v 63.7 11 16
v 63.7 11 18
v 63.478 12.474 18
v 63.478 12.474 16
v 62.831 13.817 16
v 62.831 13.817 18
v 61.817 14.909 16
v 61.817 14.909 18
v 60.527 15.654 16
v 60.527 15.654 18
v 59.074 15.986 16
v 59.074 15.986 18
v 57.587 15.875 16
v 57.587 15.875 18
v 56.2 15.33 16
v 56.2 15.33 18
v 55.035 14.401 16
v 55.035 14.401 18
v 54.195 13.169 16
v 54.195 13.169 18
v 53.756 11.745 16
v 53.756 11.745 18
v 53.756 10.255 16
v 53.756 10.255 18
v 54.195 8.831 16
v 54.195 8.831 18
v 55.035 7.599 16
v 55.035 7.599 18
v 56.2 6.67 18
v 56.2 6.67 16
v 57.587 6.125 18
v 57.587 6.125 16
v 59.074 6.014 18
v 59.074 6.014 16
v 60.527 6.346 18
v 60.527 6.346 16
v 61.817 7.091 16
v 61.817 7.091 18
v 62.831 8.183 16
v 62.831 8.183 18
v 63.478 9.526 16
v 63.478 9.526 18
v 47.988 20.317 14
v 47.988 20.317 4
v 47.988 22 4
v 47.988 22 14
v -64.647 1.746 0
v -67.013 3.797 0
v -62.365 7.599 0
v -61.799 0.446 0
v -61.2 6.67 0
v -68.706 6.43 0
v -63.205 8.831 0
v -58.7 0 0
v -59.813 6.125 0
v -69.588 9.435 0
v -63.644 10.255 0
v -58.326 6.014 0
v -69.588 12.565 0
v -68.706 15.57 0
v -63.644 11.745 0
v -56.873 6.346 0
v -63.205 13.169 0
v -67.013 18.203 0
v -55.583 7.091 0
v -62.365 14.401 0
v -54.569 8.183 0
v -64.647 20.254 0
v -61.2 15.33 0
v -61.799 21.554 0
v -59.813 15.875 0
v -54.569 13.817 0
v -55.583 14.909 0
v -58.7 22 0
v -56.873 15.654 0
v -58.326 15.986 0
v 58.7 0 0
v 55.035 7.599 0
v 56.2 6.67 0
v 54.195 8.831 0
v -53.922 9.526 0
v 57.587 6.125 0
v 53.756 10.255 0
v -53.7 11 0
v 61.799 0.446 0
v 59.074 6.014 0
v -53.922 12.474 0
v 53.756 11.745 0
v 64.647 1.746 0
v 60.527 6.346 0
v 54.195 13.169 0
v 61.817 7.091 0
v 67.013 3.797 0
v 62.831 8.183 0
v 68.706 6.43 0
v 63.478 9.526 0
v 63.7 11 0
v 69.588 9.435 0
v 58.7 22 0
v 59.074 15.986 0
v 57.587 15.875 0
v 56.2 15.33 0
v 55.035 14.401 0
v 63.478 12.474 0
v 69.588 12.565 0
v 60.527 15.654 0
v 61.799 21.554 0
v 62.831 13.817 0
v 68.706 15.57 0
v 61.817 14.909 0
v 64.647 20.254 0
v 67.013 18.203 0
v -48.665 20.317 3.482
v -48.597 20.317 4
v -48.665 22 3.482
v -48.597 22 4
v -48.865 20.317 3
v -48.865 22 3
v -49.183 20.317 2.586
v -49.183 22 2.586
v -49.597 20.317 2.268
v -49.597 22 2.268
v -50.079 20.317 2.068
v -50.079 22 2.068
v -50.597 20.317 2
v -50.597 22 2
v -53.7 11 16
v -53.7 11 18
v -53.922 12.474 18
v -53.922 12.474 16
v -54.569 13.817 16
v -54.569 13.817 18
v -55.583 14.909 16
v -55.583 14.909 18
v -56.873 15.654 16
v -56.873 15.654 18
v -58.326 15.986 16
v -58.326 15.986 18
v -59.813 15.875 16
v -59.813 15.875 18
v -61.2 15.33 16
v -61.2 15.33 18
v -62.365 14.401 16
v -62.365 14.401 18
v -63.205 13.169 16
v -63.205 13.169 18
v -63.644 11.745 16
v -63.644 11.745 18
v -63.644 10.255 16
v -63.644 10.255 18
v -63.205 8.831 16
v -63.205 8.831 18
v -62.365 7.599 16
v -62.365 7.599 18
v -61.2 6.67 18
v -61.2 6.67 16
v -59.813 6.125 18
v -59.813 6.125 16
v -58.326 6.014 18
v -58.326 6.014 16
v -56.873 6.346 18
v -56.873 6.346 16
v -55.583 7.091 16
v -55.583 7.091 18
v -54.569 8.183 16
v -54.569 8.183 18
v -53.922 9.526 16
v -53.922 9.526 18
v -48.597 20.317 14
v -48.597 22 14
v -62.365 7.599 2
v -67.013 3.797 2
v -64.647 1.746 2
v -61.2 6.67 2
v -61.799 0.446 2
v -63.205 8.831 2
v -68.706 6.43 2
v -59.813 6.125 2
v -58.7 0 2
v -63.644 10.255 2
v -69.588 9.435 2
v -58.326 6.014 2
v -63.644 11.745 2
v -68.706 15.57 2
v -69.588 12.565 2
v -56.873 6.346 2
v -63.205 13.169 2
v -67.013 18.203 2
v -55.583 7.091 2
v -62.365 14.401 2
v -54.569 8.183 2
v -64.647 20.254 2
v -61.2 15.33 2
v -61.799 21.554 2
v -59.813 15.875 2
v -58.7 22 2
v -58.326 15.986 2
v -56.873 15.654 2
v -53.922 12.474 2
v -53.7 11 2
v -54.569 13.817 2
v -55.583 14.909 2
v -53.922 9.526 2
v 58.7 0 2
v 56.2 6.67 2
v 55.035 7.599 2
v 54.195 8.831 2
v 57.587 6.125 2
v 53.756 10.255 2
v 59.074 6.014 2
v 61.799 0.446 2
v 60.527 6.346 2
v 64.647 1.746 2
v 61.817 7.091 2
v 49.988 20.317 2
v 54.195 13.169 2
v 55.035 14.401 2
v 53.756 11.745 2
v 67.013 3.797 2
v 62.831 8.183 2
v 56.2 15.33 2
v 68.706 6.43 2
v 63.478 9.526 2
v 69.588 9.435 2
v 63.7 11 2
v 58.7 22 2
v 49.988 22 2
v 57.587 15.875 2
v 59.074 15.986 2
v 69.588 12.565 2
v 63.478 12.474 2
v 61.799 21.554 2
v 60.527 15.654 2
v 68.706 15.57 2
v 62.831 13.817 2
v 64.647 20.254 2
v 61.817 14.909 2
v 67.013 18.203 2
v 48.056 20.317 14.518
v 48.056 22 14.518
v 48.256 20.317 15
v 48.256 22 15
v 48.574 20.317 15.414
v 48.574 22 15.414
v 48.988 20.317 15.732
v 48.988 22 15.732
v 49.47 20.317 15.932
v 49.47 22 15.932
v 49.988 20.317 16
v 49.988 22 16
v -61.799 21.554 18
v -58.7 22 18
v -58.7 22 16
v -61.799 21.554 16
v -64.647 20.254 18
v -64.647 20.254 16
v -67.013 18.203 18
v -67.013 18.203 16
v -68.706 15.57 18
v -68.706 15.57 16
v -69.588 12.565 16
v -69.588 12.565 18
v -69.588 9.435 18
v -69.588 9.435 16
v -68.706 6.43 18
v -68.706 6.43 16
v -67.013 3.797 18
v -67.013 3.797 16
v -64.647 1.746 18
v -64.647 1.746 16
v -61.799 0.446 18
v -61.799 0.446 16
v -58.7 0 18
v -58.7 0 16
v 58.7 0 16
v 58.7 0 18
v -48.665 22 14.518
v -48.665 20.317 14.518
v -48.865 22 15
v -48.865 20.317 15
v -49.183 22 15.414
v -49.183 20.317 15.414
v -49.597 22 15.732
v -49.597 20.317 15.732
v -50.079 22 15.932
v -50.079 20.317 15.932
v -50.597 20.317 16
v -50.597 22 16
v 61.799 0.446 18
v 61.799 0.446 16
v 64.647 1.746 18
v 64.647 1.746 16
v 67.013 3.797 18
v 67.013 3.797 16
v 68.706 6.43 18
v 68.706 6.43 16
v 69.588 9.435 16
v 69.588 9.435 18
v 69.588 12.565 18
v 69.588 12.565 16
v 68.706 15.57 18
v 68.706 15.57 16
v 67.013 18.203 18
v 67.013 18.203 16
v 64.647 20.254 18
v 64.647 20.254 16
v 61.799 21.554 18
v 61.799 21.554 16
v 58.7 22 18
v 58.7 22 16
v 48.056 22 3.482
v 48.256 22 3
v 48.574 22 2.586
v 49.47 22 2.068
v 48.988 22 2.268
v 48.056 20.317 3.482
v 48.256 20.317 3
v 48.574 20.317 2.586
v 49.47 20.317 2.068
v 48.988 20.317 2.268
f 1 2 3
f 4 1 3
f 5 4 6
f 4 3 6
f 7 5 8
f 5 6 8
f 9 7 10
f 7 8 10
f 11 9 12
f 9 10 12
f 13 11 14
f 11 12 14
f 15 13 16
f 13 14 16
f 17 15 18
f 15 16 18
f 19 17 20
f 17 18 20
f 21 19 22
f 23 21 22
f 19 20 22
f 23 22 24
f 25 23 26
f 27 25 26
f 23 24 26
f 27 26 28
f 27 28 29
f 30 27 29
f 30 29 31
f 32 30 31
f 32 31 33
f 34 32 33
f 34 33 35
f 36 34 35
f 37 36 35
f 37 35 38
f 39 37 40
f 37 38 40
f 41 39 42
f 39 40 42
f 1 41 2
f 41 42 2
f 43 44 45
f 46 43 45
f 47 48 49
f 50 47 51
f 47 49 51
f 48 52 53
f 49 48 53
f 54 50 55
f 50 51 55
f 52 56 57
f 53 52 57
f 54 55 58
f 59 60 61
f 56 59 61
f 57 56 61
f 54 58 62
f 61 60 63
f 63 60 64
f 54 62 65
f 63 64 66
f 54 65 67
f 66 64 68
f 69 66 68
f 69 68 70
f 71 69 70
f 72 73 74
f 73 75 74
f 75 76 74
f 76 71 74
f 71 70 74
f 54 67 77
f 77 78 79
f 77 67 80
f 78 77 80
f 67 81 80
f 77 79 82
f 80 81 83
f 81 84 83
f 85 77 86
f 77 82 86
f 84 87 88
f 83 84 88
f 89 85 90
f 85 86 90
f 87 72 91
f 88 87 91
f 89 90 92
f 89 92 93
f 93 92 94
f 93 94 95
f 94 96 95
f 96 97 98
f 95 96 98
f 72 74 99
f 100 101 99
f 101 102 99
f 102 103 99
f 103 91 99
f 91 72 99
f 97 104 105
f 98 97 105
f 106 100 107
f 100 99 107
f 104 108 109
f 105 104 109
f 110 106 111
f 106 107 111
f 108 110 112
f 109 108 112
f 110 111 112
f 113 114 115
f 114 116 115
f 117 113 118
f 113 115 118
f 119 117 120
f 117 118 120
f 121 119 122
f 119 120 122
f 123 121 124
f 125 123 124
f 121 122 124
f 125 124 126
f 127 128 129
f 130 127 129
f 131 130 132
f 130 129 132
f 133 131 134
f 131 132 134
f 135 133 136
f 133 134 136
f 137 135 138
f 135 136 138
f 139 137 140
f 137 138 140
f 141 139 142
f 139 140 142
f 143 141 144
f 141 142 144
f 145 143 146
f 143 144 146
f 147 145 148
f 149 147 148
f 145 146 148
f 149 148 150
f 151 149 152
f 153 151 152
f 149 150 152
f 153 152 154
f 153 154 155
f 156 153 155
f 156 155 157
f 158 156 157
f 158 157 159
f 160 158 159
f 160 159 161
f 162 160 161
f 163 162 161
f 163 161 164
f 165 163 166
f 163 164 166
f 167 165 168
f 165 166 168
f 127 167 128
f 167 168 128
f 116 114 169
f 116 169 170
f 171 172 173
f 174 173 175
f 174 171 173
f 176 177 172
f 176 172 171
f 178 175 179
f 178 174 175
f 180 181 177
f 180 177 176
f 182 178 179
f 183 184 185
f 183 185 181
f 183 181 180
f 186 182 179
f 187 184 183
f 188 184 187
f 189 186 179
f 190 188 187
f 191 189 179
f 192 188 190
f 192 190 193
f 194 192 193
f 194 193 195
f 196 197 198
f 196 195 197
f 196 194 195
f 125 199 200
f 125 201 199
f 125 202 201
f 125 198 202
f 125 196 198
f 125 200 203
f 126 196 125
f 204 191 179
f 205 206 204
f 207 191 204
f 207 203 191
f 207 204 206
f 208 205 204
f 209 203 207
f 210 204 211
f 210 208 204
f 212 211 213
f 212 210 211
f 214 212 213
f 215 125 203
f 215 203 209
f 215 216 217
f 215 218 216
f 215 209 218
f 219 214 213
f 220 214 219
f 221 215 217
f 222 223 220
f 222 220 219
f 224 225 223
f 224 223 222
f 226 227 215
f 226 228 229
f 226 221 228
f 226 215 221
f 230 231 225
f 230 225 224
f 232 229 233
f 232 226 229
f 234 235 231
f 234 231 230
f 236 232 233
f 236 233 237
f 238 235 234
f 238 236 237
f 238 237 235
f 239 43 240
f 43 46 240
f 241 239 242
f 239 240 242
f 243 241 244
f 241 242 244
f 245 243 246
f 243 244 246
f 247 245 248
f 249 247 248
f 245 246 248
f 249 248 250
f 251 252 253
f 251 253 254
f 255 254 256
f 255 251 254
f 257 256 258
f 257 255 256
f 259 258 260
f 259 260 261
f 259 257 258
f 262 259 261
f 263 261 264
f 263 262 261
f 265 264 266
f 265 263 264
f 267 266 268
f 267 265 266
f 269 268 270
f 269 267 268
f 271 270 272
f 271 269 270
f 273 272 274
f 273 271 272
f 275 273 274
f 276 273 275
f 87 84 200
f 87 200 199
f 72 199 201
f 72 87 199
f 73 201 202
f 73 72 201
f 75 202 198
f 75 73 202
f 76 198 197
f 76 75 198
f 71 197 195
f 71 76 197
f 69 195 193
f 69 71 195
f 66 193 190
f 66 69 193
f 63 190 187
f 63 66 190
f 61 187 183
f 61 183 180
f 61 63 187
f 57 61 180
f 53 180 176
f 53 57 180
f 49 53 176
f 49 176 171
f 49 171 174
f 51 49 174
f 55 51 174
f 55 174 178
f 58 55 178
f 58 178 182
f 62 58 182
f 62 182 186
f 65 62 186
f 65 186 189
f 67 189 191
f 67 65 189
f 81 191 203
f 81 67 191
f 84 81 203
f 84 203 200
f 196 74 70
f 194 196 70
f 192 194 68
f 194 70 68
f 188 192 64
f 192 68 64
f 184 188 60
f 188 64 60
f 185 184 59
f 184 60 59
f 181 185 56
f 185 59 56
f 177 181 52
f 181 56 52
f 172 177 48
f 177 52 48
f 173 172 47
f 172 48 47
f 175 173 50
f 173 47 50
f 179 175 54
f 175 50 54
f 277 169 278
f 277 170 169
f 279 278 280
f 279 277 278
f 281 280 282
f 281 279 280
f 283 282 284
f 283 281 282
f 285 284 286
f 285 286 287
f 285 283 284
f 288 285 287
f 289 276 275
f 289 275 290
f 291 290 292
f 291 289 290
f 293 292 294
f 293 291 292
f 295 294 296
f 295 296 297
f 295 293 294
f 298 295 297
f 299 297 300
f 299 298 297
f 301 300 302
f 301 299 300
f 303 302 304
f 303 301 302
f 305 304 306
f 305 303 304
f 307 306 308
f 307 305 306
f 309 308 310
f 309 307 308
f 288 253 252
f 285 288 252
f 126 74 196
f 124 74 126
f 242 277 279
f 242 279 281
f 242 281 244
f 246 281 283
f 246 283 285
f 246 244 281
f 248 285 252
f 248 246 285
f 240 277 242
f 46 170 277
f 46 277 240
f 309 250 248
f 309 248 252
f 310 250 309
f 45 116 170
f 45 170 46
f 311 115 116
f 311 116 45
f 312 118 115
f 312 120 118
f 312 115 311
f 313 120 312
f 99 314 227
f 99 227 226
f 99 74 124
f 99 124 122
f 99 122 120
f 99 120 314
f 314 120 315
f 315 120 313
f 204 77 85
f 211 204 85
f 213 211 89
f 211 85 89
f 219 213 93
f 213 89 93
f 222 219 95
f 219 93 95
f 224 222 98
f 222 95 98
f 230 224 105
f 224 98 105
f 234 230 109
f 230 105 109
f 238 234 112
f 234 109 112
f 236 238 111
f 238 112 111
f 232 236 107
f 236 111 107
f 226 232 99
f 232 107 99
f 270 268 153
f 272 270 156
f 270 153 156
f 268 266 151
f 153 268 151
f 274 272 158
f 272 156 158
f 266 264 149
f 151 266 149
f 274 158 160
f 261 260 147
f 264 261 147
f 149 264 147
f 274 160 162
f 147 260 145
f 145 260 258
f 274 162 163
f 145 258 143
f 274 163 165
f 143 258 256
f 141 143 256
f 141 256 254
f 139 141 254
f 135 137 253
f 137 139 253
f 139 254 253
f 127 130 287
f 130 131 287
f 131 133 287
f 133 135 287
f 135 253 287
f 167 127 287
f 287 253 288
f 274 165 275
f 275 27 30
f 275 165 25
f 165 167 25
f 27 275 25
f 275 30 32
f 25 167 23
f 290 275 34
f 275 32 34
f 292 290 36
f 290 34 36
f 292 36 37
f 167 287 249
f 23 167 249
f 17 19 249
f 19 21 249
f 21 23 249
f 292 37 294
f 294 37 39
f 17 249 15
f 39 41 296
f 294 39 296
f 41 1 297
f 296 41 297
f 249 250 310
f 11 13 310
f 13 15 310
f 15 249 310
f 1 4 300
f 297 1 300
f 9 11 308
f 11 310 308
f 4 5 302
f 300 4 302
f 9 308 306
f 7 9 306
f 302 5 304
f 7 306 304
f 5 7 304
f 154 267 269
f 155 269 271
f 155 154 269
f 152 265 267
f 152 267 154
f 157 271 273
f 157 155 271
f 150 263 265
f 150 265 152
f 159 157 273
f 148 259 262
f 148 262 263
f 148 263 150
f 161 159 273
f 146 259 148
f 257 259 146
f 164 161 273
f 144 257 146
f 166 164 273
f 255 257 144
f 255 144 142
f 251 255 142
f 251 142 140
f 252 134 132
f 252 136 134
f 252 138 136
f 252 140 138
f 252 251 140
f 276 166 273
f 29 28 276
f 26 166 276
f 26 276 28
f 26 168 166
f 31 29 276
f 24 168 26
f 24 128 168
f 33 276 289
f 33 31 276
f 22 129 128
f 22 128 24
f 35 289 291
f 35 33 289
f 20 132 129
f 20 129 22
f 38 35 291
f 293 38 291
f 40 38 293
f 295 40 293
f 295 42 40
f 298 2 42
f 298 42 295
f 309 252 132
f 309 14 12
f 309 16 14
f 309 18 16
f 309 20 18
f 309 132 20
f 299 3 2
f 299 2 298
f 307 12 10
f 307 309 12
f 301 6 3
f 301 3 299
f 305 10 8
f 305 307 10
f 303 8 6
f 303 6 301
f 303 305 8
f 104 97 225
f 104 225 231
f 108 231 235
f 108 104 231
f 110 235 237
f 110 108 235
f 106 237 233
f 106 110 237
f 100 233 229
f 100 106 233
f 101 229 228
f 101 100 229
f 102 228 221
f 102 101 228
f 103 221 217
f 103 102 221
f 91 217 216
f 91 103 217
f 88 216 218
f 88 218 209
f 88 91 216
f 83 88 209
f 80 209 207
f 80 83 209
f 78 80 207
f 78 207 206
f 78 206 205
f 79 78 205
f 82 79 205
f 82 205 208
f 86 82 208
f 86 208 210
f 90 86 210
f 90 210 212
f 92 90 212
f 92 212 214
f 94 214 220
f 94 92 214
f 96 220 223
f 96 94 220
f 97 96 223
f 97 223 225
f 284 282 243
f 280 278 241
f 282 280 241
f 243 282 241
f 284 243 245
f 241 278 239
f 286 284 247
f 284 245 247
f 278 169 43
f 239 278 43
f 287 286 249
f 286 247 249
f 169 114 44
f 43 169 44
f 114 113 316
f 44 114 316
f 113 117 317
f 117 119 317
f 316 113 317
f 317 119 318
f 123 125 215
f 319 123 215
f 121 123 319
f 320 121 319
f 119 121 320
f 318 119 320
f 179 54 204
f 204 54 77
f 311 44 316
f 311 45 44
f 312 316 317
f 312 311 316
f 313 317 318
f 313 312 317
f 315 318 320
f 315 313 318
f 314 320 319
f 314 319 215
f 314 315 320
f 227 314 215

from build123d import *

# Parameters (mm, degrees)
SKETCH1_R           = 5
BOSS_EXTRUDE1_DEPTH = 2
SKETCH2_W           = 96.58456166
SKETCH2_H           = 1.682573812
BOSS_EXTRUDE2_DEPTH = 3.5
FILLET1_R           = 2


with BuildPart() as part:
    # Sketch1 → Boss-Extrude1 (new body)
    with BuildSketch(Plane.XY):
        with BuildLine():
            Line((-58.7, 0), (58.7, 0))
            ThreePointArc((58.7, 0), (69.7, 11), (58.7, 22))
            Line((58.7, 22), (-58.7, 22))
            ThreePointArc((-58.7, 22), (-69.7, 11), (-58.7, 0))
        make_face()
        with Locations((-58.7, 11)):
            Circle(SKETCH1_R, mode=Mode.SUBTRACT)
        with Locations((58.7, 11)):
            Circle(SKETCH1_R, mode=Mode.SUBTRACT)
    extrude(amount=BOSS_EXTRUDE1_DEPTH)

    # Sketch2 → Boss-Extrude2 (add)
    with BuildSketch(Plane.XY.offset(2)):
        with Locations((-0.304491052, 21.158713094)):
            Rectangle(SKETCH2_W, SKETCH2_H)
    boss_extrude2 = extrude(amount=BOSS_EXTRUDE2_DEPTH)

    # Mirror1: Boss-Extrude2 across plane
    add(boss_extrude2.mirror(Plane.XY.offset(5.5)))

    # Mirror2: part across plane


with BuildPart() as part_1:
    add(part.part)
    add(part.part.mirror(Plane(origin=(0, 0, 9), x_dir=(1, 0, 0), z_dir=(0, 0, -1))))

    # Fillet1
    fillet1_edges = [part_1.edges().sort_by_distance(p)[0] for p in [
        (-48.596771882, 21.158713094, 2),
        (47.987789778, 21.158713094, 2),
        (-48.596771882, 21.158713094, 16),
        (47.987789778, 21.158713094, 16),
    ]]
    fillet(fillet1_edges, radius=FILLET1_R)


solid = part_1.part
